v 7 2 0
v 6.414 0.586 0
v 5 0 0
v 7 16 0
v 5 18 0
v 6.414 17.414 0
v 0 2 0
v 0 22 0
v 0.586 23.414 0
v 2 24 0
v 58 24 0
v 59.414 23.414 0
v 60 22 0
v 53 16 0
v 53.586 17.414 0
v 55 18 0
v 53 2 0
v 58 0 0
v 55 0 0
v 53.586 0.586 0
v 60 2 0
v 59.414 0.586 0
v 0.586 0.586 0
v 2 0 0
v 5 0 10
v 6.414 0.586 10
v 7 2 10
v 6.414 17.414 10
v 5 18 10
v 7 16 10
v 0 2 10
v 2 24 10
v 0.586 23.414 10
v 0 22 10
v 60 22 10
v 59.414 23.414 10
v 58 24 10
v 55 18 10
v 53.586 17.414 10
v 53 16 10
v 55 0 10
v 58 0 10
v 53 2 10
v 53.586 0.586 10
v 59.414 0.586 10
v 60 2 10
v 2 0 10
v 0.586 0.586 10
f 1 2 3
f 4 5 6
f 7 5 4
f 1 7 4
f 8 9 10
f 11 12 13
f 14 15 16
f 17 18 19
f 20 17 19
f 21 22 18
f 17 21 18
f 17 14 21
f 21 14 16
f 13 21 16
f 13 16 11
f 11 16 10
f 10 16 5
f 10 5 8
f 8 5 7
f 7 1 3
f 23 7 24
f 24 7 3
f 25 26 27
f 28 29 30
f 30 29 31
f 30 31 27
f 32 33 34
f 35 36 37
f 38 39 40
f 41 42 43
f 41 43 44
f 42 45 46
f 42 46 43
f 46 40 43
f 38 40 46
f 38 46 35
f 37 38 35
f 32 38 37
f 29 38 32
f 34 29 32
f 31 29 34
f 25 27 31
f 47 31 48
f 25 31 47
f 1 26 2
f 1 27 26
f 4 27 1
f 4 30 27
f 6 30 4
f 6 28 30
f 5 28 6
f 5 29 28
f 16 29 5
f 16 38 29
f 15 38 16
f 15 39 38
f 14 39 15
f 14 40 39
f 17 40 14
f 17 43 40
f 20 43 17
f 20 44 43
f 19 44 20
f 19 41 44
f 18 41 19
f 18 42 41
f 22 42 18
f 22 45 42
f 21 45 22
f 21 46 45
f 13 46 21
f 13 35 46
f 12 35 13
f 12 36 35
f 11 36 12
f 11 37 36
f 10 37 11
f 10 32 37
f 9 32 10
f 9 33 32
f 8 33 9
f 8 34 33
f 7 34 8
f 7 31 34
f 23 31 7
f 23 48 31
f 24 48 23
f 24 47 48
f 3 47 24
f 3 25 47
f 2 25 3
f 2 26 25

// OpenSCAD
$fn = 32;

// ----------------------------------------------------------------------
// Clip blank: staple clip, 10 mm thick
// ----------------------------------------------------------------------

// --- parameters (mm) ---
profile_height = 10;      // extrusion height
profile_points = 24;      // points of the closed outline

profile = [[0, 2], [0.586, 0.586], [2, 0], [5, 0], [6.414, 0.586], [7, 2], [7, 16], [6.414, 17.414], [5, 18], [55, 18], [53.586, 17.414], [53, 16], [53, 2], [53.586, 0.586], [55, 0], [58, 0], [59.414, 0.586], [60, 2], [60, 22], [59.414, 23.414], [58, 24], [2, 24], [0.586, 23.414], [0, 22]];  // single closed polygon, 24 points, counter clockwise

// --- the one profile operation ---
linear_extrude(height = profile_height) polygon(points = profile);
